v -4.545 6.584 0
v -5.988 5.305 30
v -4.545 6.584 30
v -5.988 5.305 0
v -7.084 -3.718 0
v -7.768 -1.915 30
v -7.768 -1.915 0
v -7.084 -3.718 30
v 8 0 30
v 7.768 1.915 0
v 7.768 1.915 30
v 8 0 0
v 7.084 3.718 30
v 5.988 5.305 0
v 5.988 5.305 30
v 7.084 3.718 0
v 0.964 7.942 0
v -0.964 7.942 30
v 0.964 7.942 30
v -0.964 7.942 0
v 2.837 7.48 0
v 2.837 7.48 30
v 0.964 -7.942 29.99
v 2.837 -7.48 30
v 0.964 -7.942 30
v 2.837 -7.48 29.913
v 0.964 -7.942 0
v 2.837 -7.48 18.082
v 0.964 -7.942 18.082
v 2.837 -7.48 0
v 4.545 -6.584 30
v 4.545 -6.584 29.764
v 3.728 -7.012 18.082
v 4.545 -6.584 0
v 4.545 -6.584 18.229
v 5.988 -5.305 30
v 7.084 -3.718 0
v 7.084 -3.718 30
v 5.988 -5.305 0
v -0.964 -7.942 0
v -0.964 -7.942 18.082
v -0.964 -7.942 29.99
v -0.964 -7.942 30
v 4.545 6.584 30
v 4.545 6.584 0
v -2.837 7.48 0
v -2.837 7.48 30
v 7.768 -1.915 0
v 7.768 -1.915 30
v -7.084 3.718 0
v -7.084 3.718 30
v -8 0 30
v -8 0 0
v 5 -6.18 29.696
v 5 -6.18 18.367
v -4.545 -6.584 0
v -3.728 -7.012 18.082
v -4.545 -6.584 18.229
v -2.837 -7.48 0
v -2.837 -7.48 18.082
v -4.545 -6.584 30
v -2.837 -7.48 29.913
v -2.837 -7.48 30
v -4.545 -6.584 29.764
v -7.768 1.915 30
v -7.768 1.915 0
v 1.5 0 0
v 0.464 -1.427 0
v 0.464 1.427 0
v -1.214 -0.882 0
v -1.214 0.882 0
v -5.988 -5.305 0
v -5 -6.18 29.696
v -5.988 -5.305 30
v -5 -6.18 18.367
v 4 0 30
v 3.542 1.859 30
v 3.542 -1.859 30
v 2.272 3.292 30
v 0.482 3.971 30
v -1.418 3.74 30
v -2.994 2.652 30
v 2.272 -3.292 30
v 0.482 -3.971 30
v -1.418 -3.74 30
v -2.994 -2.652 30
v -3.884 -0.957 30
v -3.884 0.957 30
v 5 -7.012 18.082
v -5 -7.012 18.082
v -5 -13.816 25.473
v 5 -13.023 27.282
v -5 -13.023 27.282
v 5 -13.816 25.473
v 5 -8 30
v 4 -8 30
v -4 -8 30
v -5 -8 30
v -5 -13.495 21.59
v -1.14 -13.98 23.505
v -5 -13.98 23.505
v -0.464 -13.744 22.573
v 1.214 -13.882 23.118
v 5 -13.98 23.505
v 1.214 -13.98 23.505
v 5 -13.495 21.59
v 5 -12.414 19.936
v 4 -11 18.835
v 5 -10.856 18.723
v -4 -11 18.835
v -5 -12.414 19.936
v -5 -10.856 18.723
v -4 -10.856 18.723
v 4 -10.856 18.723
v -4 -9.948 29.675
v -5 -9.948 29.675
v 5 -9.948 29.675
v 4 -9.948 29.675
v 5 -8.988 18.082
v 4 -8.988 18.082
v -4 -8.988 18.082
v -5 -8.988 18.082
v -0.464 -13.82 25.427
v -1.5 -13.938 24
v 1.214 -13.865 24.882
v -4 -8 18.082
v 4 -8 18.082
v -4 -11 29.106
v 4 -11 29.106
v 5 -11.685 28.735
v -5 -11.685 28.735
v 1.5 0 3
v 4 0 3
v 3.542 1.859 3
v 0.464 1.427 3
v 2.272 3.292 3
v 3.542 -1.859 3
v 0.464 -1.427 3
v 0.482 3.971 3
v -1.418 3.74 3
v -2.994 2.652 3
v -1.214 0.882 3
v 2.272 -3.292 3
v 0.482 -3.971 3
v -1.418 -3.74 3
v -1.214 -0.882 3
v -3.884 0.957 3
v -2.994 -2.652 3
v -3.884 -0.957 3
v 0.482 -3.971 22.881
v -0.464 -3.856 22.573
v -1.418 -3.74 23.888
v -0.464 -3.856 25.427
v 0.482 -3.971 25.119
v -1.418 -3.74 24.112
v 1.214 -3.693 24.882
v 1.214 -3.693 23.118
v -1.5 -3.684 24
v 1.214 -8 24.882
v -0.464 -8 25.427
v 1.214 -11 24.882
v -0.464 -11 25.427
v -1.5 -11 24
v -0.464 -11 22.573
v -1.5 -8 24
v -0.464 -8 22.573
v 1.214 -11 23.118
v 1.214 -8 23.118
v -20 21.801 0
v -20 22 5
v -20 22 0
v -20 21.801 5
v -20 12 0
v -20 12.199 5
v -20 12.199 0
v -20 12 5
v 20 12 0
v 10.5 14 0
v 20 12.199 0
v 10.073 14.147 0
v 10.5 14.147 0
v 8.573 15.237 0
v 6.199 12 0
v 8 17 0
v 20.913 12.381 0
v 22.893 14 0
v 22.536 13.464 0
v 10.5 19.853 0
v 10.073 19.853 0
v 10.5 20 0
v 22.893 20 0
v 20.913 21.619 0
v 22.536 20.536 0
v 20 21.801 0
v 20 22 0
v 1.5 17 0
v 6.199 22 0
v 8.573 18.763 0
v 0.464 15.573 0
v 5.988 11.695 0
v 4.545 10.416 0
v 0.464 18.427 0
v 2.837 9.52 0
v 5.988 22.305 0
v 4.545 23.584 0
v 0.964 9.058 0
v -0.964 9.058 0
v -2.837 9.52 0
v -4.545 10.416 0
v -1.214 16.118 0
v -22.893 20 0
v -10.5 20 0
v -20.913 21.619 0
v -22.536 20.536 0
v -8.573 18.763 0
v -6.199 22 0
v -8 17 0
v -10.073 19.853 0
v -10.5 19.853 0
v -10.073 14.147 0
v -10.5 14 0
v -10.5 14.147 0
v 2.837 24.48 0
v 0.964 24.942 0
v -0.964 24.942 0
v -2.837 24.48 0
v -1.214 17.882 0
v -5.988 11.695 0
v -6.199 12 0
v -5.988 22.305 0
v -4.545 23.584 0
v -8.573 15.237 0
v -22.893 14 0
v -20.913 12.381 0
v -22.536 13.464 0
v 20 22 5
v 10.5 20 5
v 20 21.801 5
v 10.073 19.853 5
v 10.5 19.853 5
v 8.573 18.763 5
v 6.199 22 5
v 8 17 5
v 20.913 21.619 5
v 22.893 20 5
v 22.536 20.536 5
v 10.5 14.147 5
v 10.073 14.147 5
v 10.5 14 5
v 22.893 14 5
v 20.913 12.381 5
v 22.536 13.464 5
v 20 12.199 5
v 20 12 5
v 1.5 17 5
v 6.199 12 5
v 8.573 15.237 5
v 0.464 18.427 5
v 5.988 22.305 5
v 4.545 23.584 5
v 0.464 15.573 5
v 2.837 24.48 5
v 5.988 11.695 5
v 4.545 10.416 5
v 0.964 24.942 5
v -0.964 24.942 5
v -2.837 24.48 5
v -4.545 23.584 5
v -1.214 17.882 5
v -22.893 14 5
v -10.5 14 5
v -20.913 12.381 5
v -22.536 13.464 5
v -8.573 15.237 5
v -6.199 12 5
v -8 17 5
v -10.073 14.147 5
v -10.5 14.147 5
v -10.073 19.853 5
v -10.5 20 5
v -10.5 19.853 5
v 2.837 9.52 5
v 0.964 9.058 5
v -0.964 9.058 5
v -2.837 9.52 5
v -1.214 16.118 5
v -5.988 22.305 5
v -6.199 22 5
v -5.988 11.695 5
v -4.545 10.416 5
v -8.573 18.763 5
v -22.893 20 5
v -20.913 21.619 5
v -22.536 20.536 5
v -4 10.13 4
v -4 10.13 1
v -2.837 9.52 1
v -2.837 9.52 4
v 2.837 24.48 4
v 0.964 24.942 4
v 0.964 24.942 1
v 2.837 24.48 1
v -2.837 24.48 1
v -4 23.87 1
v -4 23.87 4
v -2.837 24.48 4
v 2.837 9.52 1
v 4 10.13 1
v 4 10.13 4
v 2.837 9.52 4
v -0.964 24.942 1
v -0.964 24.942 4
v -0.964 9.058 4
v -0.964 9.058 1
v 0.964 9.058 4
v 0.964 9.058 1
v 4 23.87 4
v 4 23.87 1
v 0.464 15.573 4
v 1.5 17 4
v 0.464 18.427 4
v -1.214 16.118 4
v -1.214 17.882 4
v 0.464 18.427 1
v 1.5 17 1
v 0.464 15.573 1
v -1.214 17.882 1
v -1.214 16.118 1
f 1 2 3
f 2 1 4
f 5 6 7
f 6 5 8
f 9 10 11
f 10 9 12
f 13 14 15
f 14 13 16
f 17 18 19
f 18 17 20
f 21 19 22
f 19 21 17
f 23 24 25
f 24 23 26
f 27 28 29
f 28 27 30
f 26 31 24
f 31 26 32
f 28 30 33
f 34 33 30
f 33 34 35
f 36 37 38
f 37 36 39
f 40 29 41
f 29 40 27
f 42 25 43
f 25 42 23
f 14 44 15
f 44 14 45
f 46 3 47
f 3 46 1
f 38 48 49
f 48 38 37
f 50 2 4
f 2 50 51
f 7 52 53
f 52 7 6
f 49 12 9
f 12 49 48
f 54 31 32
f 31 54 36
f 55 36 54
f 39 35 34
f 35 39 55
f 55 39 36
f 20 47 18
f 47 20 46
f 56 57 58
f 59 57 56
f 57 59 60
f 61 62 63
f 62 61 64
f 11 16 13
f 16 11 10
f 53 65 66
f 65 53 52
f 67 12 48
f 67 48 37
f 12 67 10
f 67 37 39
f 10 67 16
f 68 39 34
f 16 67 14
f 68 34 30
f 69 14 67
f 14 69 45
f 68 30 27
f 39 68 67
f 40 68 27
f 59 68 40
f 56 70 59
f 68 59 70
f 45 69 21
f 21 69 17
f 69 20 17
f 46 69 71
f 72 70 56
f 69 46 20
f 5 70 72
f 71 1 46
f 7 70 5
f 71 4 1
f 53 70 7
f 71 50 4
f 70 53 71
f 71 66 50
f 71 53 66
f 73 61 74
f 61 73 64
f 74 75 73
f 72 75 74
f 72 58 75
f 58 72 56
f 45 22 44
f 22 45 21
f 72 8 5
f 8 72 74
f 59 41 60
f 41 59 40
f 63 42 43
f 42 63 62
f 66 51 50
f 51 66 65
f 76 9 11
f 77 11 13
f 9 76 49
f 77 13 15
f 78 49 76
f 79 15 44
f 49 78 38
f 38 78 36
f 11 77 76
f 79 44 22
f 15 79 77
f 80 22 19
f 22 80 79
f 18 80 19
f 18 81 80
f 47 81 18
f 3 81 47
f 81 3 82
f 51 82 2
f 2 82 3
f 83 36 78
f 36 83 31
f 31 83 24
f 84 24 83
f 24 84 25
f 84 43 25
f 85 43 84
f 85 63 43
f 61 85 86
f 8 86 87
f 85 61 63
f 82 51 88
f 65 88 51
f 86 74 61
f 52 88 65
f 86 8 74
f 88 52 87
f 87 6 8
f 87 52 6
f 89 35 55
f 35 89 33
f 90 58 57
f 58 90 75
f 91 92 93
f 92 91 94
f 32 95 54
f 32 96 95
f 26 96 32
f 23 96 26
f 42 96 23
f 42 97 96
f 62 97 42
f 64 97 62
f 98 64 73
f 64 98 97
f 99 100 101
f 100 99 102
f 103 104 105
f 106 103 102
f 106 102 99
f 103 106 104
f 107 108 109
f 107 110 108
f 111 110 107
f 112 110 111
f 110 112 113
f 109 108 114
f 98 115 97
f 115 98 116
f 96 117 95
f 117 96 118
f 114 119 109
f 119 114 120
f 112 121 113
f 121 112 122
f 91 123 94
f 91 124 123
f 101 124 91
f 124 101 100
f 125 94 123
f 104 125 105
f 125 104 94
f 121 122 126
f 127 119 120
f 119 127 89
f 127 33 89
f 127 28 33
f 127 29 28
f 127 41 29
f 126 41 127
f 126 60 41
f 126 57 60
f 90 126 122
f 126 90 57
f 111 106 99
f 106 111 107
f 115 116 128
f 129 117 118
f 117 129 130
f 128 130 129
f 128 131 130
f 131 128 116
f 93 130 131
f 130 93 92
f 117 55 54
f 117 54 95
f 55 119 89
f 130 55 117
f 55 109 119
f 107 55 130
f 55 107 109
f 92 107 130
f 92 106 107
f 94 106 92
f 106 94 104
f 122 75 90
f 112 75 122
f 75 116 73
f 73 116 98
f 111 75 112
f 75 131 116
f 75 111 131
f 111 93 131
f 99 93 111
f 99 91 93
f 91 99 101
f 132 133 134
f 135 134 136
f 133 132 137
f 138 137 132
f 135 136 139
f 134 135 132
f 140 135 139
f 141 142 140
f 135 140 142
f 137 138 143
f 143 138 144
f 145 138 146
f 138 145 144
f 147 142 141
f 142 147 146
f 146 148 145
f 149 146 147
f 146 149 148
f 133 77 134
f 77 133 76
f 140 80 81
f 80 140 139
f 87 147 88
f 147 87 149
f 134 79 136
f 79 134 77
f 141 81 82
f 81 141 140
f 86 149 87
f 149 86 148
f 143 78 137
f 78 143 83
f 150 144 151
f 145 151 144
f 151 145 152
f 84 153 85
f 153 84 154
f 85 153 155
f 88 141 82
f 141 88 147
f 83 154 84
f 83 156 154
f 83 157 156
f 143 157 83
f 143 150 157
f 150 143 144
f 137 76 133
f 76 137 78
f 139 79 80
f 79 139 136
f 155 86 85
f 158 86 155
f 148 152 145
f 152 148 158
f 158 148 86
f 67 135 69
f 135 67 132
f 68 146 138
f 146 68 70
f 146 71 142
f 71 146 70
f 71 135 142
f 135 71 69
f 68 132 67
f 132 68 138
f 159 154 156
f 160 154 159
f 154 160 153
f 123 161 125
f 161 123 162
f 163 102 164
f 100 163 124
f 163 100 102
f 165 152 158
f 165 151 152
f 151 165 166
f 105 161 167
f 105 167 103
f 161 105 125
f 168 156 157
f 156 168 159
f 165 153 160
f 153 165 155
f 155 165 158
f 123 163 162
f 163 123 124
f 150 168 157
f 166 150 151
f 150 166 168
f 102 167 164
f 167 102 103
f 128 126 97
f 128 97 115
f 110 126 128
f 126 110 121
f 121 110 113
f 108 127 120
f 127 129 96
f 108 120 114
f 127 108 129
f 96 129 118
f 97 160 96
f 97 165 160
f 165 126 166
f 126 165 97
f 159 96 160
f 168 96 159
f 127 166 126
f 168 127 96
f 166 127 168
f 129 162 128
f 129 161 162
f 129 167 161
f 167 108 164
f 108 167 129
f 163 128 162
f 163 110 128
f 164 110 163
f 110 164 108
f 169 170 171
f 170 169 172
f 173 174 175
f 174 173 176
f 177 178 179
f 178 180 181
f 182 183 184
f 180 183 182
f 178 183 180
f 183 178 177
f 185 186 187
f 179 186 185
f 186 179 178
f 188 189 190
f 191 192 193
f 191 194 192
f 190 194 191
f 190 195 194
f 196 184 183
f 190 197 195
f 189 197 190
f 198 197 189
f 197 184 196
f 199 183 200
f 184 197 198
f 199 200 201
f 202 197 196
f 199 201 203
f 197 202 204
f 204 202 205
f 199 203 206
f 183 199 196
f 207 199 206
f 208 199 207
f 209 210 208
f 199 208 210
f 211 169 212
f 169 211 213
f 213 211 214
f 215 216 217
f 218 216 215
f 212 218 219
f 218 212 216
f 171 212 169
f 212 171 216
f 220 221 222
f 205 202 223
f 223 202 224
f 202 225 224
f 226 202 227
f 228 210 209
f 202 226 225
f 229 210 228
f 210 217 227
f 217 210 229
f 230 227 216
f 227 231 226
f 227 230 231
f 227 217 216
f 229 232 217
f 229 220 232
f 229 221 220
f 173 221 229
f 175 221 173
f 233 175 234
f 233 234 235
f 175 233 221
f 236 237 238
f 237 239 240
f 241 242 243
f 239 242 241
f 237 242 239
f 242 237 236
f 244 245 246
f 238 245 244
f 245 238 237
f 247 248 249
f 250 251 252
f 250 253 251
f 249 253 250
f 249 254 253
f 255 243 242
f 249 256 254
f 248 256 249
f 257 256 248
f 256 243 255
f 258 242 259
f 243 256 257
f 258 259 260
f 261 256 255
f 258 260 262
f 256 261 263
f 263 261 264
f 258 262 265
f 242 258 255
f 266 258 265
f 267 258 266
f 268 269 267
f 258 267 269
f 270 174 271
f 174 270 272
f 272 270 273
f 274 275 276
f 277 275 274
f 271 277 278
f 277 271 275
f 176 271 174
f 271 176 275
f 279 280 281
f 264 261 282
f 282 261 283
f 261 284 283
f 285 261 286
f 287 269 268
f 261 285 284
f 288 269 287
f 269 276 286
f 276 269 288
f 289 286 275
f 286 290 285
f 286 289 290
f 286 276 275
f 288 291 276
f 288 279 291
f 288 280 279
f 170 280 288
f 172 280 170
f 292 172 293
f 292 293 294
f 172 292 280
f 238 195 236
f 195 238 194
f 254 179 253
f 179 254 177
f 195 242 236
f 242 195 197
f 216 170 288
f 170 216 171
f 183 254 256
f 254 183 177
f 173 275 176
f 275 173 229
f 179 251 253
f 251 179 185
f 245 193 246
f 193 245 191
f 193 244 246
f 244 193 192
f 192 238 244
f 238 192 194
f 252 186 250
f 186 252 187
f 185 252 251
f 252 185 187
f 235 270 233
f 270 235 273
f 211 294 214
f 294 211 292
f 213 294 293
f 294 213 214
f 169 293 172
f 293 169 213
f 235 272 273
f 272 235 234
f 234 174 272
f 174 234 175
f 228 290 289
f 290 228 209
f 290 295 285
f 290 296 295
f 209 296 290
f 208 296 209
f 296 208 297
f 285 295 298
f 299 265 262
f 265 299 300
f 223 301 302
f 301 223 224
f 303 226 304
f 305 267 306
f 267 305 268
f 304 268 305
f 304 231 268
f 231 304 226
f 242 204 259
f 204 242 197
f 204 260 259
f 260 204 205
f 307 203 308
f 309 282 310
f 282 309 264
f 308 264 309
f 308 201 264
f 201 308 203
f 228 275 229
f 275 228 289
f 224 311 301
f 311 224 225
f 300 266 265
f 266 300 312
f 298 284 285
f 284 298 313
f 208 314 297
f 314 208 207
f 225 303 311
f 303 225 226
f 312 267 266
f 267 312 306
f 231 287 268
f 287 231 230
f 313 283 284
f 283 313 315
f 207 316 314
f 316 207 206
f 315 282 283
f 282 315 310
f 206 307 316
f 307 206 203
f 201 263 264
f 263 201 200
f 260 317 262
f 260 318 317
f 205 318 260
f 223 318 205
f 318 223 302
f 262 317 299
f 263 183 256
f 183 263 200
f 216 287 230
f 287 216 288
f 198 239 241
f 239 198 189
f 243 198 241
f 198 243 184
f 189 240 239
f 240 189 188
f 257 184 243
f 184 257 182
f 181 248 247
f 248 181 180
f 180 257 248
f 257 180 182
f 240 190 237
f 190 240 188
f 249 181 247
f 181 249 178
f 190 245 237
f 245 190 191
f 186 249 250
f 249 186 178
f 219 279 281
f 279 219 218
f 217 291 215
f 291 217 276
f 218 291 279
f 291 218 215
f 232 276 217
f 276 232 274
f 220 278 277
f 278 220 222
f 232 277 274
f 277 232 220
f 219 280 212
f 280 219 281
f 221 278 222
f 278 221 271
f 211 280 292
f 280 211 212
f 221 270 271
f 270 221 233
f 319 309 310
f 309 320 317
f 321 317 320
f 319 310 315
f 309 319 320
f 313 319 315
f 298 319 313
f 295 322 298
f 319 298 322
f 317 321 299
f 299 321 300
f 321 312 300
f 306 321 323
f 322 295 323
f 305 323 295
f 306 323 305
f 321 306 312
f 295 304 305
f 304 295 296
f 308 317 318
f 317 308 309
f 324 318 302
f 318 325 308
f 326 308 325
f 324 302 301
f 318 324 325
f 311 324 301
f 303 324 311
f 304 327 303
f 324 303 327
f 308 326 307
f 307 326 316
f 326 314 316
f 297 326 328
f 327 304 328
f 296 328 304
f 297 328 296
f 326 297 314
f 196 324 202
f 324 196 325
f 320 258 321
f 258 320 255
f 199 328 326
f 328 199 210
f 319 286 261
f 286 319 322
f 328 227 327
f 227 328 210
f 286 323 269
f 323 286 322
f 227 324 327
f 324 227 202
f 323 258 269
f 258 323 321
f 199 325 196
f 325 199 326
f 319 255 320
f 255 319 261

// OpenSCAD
// base to hold 8 mm bar - for optics holders
// base held down with M6 bolts
// 8 mm bar held with M3 grubscrew
//tube and bottom couple with M3
// GNU GPLv2
// by amk


rotate([0,180,0]) translate([0,0,2.5])tube();
rotate([0,180,0]) translate([0,17,-2.5]) bottom();

h = 30; //height of cylinder section

%cube([200,200,0.01],true);

module bottom()
{
difference(){

union(){
translate([0, 0,0])cube([40,10,5], center=true);
translate([-19, 0,-0])cylinder(5,5,5, center=true);
translate([19, 0,0])cylinder(5,5,5, center=true);
rotate([0,180,0])translate([0, 0,0])cylinder(5,8,8, center=true);
}

translate([-11, 0,0])cylinder(14,3,3, center=true);
translate([-18, 0,0])cube([15,6,12], center=true);
translate([11, 0,0])cylinder(14,3,3, center=true);
translate([18, 0,0])cube([15,6,12], center=true);
translate([0, 0,0])rotate([0,90,0])cube([3,20,8], center=true);
rotate([0,180,0])translate([0, 0,0])cylinder(10,1.5,1.5, center=true);


}

}


module tube(){
difference(){
union(){
rotate([0,180,0])translate([0, 0,2.5])cylinder(h,8,8, center=false);
translate([0, -8,-h+3.5])rotate([0,90,0])cylinder(10,6,6, center=true); //cylinder for grub screw
//translate([0, -8,-h+3.5])sphere(6, center=true); // or sphere for grub screw
}
rotate([0,180,0])translate([0, 0,2.5+3])cylinder(h,4,4, center=false);
rotate([0,180,0])translate([0, 0,0])cylinder(8,1.5,1.5, center=false);
translate([0, -8,-h+3.5])rotate([90,0,0])cylinder(20,1.5,1.5, center=true);
translate([0, -9.5,-h+3.5])cube([8,3,12], center=true);
}
}
